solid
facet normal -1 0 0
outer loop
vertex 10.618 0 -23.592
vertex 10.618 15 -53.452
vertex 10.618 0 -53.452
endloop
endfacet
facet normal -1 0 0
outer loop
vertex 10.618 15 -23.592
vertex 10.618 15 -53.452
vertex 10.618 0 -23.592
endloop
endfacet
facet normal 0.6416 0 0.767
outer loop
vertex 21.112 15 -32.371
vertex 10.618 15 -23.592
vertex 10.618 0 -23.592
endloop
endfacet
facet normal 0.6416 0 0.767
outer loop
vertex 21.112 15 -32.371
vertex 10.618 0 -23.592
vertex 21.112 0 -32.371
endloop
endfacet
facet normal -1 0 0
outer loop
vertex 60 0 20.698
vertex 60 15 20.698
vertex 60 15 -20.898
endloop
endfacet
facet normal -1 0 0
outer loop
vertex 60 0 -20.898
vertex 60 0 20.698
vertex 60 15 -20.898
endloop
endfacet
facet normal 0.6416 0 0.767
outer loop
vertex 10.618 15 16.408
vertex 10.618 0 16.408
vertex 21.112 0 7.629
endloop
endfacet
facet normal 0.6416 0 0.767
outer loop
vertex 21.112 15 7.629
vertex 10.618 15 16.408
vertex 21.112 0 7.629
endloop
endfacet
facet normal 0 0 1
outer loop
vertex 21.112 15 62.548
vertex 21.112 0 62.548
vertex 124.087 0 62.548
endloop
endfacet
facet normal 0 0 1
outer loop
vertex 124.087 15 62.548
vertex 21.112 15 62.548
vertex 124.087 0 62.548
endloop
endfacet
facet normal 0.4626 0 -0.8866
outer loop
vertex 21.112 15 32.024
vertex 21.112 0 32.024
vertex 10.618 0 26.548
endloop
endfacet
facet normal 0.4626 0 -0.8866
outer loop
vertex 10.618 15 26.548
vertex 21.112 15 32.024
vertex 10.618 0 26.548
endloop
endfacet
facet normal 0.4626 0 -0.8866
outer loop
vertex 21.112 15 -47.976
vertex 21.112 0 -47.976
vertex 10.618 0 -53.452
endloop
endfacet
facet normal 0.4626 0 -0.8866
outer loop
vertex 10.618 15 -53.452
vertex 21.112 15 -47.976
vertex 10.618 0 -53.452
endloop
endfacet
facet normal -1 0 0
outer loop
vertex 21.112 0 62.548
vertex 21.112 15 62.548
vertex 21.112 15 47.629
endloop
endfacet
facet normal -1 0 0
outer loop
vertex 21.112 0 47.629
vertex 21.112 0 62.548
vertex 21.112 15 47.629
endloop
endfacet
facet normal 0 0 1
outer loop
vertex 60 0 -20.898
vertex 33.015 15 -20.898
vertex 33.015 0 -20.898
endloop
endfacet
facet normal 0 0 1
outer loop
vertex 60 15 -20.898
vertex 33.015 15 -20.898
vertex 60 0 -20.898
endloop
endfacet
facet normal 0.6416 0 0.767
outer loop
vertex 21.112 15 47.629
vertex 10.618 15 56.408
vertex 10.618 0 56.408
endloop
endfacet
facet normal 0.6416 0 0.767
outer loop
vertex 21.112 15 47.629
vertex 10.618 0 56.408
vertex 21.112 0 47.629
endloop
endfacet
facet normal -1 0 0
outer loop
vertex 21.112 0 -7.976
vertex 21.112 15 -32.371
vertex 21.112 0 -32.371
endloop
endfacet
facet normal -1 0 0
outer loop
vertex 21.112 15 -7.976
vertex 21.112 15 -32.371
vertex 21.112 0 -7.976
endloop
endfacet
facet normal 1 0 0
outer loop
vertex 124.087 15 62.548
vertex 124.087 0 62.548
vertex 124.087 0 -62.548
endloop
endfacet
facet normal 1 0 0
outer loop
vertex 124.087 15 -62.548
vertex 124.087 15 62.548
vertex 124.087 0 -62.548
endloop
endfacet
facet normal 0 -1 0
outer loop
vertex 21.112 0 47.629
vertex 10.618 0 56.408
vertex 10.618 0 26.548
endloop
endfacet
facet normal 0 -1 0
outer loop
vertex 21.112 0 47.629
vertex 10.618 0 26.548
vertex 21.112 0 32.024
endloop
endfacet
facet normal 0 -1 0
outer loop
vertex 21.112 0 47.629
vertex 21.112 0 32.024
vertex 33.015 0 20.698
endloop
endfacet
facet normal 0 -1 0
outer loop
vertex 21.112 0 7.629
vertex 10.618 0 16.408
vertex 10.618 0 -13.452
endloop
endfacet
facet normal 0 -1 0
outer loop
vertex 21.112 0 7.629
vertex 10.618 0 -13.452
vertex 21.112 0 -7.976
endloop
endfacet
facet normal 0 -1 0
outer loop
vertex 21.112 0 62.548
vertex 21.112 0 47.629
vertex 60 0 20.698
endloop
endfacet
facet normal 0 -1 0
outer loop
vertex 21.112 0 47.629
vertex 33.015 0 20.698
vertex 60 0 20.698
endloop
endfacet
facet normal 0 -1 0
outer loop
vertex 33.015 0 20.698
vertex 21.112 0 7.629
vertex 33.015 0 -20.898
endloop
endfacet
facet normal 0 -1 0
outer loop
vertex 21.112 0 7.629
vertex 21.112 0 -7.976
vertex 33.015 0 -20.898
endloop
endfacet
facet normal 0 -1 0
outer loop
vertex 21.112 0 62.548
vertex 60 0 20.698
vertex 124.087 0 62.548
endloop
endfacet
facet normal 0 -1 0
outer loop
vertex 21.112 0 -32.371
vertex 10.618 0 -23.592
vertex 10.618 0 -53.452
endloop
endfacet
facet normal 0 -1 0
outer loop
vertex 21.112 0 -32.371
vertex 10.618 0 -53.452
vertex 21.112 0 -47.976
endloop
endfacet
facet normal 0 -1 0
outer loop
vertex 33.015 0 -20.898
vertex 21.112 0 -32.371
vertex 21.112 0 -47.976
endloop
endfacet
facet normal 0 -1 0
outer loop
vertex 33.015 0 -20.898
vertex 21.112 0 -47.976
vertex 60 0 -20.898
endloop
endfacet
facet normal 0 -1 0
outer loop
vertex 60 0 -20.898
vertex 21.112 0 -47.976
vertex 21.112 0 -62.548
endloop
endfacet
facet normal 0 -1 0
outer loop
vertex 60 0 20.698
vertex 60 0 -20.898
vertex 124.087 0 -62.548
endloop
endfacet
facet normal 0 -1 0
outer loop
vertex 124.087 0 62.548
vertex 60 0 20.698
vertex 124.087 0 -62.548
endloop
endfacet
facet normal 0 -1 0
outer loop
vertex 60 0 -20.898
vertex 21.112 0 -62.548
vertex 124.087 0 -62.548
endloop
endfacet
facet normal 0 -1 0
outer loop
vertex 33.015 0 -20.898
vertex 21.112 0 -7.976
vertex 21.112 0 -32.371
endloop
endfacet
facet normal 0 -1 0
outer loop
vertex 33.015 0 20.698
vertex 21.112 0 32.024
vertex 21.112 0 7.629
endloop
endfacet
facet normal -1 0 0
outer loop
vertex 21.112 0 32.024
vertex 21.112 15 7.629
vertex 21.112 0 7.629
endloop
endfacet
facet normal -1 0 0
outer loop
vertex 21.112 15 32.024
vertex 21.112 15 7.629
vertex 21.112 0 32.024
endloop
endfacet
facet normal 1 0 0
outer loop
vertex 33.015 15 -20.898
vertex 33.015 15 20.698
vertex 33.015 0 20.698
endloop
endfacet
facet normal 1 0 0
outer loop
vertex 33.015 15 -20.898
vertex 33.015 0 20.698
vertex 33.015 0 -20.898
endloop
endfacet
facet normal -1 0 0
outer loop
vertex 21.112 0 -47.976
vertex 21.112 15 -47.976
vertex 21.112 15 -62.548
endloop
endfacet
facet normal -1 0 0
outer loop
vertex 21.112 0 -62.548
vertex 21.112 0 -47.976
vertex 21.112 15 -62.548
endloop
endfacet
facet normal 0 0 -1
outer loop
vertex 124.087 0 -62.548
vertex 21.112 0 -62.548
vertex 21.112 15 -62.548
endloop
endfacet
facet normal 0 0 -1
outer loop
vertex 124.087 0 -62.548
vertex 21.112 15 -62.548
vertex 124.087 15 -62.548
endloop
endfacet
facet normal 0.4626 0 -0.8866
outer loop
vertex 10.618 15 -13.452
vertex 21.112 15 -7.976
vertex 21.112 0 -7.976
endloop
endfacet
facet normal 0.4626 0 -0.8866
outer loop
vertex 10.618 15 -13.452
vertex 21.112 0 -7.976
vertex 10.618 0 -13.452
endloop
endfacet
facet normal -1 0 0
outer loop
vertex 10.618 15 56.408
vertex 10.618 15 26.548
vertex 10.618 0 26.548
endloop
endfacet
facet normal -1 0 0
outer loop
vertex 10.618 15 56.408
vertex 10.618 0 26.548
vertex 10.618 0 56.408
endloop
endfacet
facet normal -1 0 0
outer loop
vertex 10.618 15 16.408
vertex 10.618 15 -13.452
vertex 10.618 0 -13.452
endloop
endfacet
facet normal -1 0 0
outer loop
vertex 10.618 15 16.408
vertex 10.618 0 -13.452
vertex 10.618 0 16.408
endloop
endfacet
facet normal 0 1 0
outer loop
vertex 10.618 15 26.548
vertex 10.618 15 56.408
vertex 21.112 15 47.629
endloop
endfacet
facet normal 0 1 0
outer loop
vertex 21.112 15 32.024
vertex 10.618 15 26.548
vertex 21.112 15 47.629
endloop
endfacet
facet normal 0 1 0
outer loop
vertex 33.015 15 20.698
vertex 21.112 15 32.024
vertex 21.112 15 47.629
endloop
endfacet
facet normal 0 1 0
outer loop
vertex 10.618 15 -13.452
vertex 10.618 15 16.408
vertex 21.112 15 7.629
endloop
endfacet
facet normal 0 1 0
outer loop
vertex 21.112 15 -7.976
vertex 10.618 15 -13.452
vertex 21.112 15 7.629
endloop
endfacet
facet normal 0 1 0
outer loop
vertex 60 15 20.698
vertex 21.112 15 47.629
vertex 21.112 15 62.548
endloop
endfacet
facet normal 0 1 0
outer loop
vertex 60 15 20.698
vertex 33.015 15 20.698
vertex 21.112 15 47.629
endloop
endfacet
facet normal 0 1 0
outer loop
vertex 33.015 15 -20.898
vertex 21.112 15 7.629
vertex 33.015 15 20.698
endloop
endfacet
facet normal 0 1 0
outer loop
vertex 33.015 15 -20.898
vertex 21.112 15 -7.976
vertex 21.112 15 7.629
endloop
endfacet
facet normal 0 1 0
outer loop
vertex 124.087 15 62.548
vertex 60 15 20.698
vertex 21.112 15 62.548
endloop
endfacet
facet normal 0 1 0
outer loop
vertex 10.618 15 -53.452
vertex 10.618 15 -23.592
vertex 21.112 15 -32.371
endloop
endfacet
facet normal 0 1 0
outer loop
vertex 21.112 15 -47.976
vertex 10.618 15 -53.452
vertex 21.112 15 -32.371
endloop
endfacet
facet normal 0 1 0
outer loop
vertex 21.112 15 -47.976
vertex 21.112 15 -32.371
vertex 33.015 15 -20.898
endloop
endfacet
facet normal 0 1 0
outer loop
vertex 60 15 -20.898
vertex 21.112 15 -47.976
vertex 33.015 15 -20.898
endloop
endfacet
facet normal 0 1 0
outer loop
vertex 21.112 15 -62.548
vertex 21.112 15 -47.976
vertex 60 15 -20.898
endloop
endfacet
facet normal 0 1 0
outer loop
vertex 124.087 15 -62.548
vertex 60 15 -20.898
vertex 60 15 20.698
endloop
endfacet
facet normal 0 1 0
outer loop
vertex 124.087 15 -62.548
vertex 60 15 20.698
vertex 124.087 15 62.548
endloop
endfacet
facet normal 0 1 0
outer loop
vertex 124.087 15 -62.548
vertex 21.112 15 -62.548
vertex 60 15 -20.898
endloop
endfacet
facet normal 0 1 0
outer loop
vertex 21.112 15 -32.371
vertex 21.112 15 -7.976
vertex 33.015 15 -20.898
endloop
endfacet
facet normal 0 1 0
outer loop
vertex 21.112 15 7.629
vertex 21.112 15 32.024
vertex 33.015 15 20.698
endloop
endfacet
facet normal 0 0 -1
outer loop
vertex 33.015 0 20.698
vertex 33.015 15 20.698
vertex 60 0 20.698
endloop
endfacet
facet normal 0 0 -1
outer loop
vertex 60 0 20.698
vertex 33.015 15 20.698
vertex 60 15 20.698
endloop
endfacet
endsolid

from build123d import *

# Parameters (mm, degrees)
SKETCH1_W           = 280
SKETCH1_H           = 210
BOSS_EXTRUDE1_DEPTH = 15
SKETCH2_R           = 5
BOSS_EXTRUDE2_DEPTH = 50
SKETCH3_W           = 10
SKETCH3_H           = 30
BOSS_EXTRUDE3_DEPTH = 50
SKETCH4_R           = 13
CUT_EXTRUDE1_DEPTH  = 20
SKETCH5_W           = 360.4909063
SKETCH5_H           = 249.182613404
SKETCH5_W_2         = 248.173776912
SKETCH5_H_2         = 125.095724948
CUT_EXTRUDE5_DEPTH  = 15
CUT_EXTRUDE6_START  = -65
SKETCH7_R           = 5
CUT_EXTRUDE6_DEPTH  = 65
SKETCH9_W           = 29.33
SKETCH9_H           = 16.92
CUT_EXTRUDE9_DEPTH  = 148.681383345
SKETCH8_R           = 10.1
CUT_EXTRUDE11_DEPTH = 10
SKETCH11_W          = 17.231524428
SKETCH11_H          = 37.334969593
CUT_EXTRUDE13_DEPTH = 50
SKETCH15_W          = 10
SKETCH15_H          = 50
CUT_EXTRUDE14_DEPTH = 5
SKETCH13_W          = 26.98462743
SKETCH13_H          = 41.59552633
CUT_EXTRUDE17_DEPTH = 140.766916639
CUT_EXTRUDE18_DEPTH = 140.766916639


with BuildPart() as part:
    # Sketch1 → Boss-Extrude1 (new body)
    with BuildSketch(Plane(origin=(0, 0, 0), x_dir=(1, 0, 0), z_dir=(0, 1, 0))):
        Rectangle(SKETCH1_W, SKETCH1_H)
    extrude(amount=BOSS_EXTRUDE1_DEPTH)

    # Sketch2 → Boss-Extrude2 (add)
    with BuildSketch(Plane(origin=(0, 15, 0), x_dir=(1, 0, 0), z_dir=(0, 1, 0))):
        with Locations(Location((-100, 0, 0), (0, 0, 270))):
            Circle(SKETCH2_R)
        with Locations(Location((-100, 45, 0), (0, 0, 270))):
            Circle(SKETCH2_R)
        with Locations(Location((-100, -45, 0), (0, 0, 270))):
            Circle(SKETCH2_R)
    extrude(amount=BOSS_EXTRUDE2_DEPTH)

    # Sketch3 → Boss-Extrude3 (add)
    with BuildSketch(Plane(origin=(0, 15, 0), x_dir=(1, 0, 0), z_dir=(0, 1, 0))):
        Rectangle(SKETCH3_W, SKETCH3_H)
    extrude(amount=BOSS_EXTRUDE3_DEPTH)

    # Sketch4 → Cut-Extrude1 (cut)
    with BuildSketch(Plane(origin=(5, 0, 0), x_dir=(0, 0, -1), z_dir=(1, 0, 0))):
        with Locations((0, 41.236240869)):
            Circle(SKETCH4_R)
    extrude(amount=-CUT_EXTRUDE1_DEPTH, mode=Mode.SUBTRACT)

    # Sketch5 → Cut-Extrude5 (cut)
    with BuildSketch(Plane(origin=(0, 0, 0), x_dir=(1, 0, 0), z_dir=(0, 1, 0))):
        with Locations((1.345115322, -3.19464889)):
            Rectangle(SKETCH5_W, SKETCH5_H)
        Rectangle(SKETCH5_W_2, SKETCH5_H_2, mode=Mode.SUBTRACT)
    extrude(amount=CUT_EXTRUDE5_DEPTH, mode=Mode.SUBTRACT)

    # Sketch7 → Cut-Extrude6 (cut)
    with BuildSketch(Plane(origin=(0, 65, 0), x_dir=(1, 0, 0), z_dir=(0, 1, 0)).offset(CUT_EXTRUDE6_START)):
        with Locations(Location((-100, 45, 0), (0, 0, 270))):
            Circle(SKETCH7_R)
        with Locations(Location((-100, 0, 0), (0, 0, 270))):
            Circle(SKETCH7_R)
        with Locations(Location((-100, -45, 0), (0, 0, 270))):
            Circle(SKETCH7_R)
    extrude(amount=CUT_EXTRUDE6_DEPTH, mode=Mode.SUBTRACT)

    # Sketch9 → Cut-Extrude9 (cut, through all)
    with BuildSketch(Plane(origin=(0, 15, 0), x_dir=(1, 0, 0), z_dir=(0, 1, 0))):
        with Locations((-48.397782089, 47.087862474)):
            Rectangle(SKETCH9_W, SKETCH9_H)
    extrude(amount=-CUT_EXTRUDE9_DEPTH, mode=Mode.SUBTRACT)

    # Sketch8 → Cut-Extrude11 (cut)
    with BuildSketch(Plane.XZ):
        with Locations(Location((-100, 45, 0), (0, 0, 270))):
            Circle(SKETCH8_R)
        with Locations(Location((-100, 0, 0), (0, 0, 270))):
            Circle(SKETCH8_R)
        with Locations(Location((-100, -45, 0), (0, 0, 270))):
            Circle(SKETCH8_R)
    extrude(amount=-CUT_EXTRUDE11_DEPTH, mode=Mode.SUBTRACT)

    # Sketch11 → Cut-Extrude13 (cut)
    with BuildSketch(Plane(origin=(0, 65, 0), x_dir=(1, 0, 0), z_dir=(0, 1, 0))):
        with Locations((-3.002833284, 0.13632265)):
            Rectangle(SKETCH11_W, SKETCH11_H)
    extrude(amount=-CUT_EXTRUDE13_DEPTH, mode=Mode.SUBTRACT)

    # Sketch15 → Cut-Extrude14 (cut)
    with BuildSketch(Plane(origin=(0, 15, 0), x_dir=(1, 0, 0), z_dir=(0, 1, 0))):
        with Locations((-75, 0)):
            Rectangle(SKETCH15_W, SKETCH15_H)
    extrude(amount=-CUT_EXTRUDE14_DEPTH, mode=Mode.SUBTRACT)

    # Sketch13 → Cut-Extrude17 (cut, through all)
    with BuildSketch(Plane(origin=(0, 15, 0), x_dir=(1, 0, 0), z_dir=(0, 1, 0))):
        with Locations((46.507686285, 0.099999998)):
            Rectangle(SKETCH13_W, SKETCH13_H)
        with Locations((-56.507686285, 0.099999998)):
            Rectangle(SKETCH13_W, SKETCH13_H)
    extrude(amount=-CUT_EXTRUDE17_DEPTH, mode=Mode.SUBTRACT)

    # Sketch10 → Cut-Extrude18 (cut, through all)
    with BuildSketch(Plane(origin=(0, 15, 0), x_dir=(1, 0, 0), z_dir=(0, 1, 0))):
        Polygon((10.617962241, 13.45155831), (10.617962241, -16.40773575), (21.11227659, -7.629229077), (21.11227659, -32.023722987), (10.617962241, -26.54844169), (10.617962241, -56.40773575), (21.11227659, -47.629229077), (21.11227659, -62.347862477), (21.11227659, -67.048787633), (-140.704260322, -76.023181518), (-140.704260322, 77.849476584), (21.11227659, 83.143957129), (21.11227659, 62.347862473), (21.11227659, 47.976277013), (10.617962241, 53.45155831), (10.617962241, 23.59226425), (21.11227659, 32.370770923), (21.11227659, 7.976277013), align=None)
    extrude(amount=-CUT_EXTRUDE18_DEPTH, mode=Mode.SUBTRACT)


solid = part.part
